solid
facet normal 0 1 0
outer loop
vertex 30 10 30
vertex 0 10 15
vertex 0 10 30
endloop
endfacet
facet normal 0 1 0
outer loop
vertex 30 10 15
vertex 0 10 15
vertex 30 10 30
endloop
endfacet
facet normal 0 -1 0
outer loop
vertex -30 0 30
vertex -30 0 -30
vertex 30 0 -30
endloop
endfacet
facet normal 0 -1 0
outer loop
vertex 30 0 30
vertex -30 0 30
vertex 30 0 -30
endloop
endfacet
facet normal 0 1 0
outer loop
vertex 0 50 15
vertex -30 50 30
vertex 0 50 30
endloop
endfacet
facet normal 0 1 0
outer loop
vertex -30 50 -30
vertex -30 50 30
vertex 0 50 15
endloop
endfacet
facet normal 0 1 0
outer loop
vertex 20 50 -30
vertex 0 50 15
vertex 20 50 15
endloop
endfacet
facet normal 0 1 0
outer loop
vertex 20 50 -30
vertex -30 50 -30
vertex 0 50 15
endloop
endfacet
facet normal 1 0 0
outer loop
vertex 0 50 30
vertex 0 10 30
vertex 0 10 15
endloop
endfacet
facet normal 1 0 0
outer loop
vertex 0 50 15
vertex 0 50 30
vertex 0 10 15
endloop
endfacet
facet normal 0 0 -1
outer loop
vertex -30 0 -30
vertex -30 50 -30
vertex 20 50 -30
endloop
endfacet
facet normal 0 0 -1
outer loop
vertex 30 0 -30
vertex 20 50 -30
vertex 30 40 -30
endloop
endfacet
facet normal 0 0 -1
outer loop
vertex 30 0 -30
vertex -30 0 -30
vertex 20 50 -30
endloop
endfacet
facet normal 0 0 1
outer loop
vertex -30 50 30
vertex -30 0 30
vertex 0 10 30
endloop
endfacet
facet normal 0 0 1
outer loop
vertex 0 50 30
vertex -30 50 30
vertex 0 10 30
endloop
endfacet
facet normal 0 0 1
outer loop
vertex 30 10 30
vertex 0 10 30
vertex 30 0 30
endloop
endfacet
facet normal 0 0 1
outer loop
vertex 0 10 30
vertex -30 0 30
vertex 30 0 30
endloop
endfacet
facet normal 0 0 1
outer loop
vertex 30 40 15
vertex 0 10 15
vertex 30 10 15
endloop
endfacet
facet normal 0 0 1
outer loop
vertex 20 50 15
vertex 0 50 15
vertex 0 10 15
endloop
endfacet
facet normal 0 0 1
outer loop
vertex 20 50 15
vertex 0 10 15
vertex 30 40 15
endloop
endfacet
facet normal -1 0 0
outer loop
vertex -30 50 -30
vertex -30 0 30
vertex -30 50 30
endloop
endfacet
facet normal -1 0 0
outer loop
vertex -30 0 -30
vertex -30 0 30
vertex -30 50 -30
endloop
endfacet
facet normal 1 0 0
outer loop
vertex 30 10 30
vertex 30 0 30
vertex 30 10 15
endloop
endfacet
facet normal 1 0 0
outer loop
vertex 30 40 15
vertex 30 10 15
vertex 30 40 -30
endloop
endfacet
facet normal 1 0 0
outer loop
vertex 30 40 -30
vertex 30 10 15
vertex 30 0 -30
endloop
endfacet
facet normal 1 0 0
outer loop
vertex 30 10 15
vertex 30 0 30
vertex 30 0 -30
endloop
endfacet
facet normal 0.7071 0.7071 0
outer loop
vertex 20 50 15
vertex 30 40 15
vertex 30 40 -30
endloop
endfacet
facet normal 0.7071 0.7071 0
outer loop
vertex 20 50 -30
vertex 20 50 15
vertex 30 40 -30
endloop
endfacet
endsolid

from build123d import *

# Parameters (mm, degrees)
SKETCH1_W      = 60
SKETCH1_H      = 60
EXTRUDE1_DEPTH = 50
SKETCH2_W      = 30
SKETCH2_H      = 15
EXTRUDE2_DEPTH = 40
CHAMFER1_SIZE  = 10


with BuildPart() as part:
    # Sketch1 → Extrude1 (new body)
    with BuildSketch(Plane(origin=(0, 0, 0), x_dir=(1, 0, 0), z_dir=(0, 1, 0))):
        Rectangle(SKETCH1_W, SKETCH1_H)
    extrude(amount=EXTRUDE1_DEPTH)

    # Sketch2 → Extrude2 (cut)
    with BuildSketch(Plane(origin=(0, 50, 0), x_dir=(1, 0, 0), z_dir=(0, 1, 0))):
        with Locations((15, -22.5)):
            Rectangle(SKETCH2_W, SKETCH2_H)
    extrude(amount=-EXTRUDE2_DEPTH, mode=Mode.SUBTRACT)

    # Chamfer1
    chamfer1_edges = [part.edges().sort_by_distance(p)[0] for p in [
        (30, 50, -7.5),
    ]]
    chamfer(chamfer1_edges, length=CHAMFER1_SIZE)


solid = part.part
